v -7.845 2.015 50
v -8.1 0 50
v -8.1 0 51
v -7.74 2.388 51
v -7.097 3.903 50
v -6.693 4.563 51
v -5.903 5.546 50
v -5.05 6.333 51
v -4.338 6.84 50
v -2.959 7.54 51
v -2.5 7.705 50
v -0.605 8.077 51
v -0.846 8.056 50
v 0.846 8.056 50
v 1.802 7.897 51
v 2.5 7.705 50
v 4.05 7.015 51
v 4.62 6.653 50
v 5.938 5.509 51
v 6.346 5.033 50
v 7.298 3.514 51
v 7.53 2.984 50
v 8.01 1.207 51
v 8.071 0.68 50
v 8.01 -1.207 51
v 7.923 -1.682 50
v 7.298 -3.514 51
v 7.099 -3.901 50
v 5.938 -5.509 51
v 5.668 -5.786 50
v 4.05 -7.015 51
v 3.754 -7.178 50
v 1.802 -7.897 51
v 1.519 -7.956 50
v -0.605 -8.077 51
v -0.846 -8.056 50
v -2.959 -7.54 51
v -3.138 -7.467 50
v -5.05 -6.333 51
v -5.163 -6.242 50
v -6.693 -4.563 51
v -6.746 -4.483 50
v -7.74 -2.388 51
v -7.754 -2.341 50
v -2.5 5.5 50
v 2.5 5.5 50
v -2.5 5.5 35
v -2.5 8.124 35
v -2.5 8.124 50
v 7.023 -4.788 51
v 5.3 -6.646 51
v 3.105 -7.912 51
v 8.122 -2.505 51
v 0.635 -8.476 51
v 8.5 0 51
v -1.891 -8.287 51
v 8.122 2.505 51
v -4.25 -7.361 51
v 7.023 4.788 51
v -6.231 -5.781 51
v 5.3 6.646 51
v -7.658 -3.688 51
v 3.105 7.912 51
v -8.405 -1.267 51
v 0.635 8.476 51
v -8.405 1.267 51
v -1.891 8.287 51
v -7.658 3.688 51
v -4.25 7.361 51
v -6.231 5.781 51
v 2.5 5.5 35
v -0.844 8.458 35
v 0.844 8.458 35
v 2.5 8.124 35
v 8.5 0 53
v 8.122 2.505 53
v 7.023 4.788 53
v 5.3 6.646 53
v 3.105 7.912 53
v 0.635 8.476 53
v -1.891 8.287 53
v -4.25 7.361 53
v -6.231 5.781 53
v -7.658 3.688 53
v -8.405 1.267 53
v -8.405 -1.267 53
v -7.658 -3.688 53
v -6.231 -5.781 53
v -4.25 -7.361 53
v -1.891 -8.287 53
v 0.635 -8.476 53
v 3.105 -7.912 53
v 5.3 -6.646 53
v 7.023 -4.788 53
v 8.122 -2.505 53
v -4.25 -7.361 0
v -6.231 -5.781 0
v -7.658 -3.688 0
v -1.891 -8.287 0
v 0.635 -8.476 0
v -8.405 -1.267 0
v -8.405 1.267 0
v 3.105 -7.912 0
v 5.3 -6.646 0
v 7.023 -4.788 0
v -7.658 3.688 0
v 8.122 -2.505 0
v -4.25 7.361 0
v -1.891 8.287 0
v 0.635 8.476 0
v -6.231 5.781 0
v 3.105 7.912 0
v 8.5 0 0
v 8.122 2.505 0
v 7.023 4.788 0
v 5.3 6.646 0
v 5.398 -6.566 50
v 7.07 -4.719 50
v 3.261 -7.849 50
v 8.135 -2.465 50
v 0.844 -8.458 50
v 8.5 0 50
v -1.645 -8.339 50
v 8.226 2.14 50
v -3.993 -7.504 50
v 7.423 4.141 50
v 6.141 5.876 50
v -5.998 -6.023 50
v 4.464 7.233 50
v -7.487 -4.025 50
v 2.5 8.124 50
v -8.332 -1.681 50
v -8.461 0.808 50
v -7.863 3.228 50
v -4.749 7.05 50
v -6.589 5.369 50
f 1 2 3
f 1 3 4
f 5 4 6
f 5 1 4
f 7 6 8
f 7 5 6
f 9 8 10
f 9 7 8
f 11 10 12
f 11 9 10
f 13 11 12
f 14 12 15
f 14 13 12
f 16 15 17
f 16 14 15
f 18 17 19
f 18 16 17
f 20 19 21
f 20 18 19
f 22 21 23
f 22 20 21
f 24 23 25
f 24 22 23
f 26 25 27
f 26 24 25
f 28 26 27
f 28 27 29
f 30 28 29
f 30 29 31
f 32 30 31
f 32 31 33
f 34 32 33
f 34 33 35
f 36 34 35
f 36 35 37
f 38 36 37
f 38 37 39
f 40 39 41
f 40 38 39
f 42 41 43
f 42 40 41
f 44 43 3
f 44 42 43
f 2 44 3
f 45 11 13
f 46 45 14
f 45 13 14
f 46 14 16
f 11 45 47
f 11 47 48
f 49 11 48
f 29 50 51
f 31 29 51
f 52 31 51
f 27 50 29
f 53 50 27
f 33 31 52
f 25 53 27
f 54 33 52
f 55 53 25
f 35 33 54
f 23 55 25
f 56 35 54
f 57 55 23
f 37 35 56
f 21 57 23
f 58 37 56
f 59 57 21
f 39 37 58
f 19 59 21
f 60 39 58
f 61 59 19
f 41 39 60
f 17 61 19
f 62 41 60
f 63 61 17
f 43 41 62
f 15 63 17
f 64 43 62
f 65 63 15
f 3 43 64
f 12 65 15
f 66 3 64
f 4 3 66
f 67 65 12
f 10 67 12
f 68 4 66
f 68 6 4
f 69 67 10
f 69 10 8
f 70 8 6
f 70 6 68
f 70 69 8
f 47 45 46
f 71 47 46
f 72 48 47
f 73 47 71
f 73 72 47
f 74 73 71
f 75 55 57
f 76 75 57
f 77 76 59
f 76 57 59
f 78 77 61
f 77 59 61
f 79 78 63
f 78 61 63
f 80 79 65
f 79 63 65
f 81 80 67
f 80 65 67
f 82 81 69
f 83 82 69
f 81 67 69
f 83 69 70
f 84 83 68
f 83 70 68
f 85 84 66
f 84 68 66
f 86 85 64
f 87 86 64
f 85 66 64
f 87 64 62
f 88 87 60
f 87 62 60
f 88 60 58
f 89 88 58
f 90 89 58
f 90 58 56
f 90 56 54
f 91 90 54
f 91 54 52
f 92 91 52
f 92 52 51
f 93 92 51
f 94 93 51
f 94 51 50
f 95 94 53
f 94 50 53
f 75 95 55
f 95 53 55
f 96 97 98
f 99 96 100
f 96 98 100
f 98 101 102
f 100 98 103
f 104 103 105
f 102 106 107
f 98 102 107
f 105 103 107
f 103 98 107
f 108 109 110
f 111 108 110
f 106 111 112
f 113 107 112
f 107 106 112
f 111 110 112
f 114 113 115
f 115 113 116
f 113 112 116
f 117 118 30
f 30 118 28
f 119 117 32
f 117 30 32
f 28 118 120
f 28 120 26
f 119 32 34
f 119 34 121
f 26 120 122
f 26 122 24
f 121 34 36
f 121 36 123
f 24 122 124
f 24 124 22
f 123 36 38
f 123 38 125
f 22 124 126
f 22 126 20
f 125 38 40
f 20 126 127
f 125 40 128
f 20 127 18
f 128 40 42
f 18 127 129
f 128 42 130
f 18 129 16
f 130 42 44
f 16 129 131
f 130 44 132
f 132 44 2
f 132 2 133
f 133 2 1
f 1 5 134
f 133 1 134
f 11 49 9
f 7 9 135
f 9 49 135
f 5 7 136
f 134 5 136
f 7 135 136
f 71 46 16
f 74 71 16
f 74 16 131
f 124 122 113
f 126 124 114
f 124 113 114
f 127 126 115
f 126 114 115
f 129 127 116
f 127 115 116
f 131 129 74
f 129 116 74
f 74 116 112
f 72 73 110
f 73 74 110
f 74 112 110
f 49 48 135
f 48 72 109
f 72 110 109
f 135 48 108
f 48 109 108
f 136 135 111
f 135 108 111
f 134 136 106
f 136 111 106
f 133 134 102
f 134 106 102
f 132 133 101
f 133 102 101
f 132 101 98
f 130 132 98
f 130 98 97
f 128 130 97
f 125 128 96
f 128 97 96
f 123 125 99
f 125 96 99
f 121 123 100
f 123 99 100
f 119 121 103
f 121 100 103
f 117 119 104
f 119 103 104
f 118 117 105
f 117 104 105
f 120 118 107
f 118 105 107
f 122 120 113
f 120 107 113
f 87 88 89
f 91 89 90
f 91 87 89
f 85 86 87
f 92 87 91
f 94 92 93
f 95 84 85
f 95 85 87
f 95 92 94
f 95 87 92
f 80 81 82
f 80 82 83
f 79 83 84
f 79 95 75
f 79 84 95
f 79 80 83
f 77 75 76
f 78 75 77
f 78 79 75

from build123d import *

# Parameters (mm, degrees)
SKETCH1_R           = 8.5
BOSS_EXTRUDE1_DEPTH = 50
SKETCH2_W           = 5
SKETCH2_H           = 3
CUT_EXTRUDE1_DEPTH  = 15
SKETCH3_R           = 8.5
BOSS_EXTRUDE2_DEPTH = 3
SKETCH4_R           = 9
SKETCH4_R_2         = 8.1
CUT_EXTRUDE2_DEPTH  = 1


with BuildPart() as part:
    # Sketch1 → Boss-Extrude1 (new body)
    with BuildSketch(Plane.XY):
        Circle(SKETCH1_R)
    extrude(amount=BOSS_EXTRUDE1_DEPTH)

    # Sketch2 → Cut-Extrude1 (cut)
    with BuildSketch(Plane.XY.offset(50)):
        with Locations((0, 7)):
            Rectangle(SKETCH2_W, SKETCH2_H)
    extrude(amount=-CUT_EXTRUDE1_DEPTH, mode=Mode.SUBTRACT)

    # Sketch3 → Boss-Extrude2 (add)
    with BuildSketch(Plane.XY.offset(50)):
        Circle(SKETCH3_R)
    extrude(amount=BOSS_EXTRUDE2_DEPTH)

    # Sketch4 → Cut-Extrude2 (cut)
    with BuildSketch(Plane(origin=(0, 0, 50), x_dir=(-1, 0, 0), z_dir=(0, 0, -1))):
        Circle(SKETCH4_R)
        Circle(SKETCH4_R_2, mode=Mode.SUBTRACT)
    extrude(amount=-CUT_EXTRUDE2_DEPTH, mode=Mode.SUBTRACT)


solid = part.part
